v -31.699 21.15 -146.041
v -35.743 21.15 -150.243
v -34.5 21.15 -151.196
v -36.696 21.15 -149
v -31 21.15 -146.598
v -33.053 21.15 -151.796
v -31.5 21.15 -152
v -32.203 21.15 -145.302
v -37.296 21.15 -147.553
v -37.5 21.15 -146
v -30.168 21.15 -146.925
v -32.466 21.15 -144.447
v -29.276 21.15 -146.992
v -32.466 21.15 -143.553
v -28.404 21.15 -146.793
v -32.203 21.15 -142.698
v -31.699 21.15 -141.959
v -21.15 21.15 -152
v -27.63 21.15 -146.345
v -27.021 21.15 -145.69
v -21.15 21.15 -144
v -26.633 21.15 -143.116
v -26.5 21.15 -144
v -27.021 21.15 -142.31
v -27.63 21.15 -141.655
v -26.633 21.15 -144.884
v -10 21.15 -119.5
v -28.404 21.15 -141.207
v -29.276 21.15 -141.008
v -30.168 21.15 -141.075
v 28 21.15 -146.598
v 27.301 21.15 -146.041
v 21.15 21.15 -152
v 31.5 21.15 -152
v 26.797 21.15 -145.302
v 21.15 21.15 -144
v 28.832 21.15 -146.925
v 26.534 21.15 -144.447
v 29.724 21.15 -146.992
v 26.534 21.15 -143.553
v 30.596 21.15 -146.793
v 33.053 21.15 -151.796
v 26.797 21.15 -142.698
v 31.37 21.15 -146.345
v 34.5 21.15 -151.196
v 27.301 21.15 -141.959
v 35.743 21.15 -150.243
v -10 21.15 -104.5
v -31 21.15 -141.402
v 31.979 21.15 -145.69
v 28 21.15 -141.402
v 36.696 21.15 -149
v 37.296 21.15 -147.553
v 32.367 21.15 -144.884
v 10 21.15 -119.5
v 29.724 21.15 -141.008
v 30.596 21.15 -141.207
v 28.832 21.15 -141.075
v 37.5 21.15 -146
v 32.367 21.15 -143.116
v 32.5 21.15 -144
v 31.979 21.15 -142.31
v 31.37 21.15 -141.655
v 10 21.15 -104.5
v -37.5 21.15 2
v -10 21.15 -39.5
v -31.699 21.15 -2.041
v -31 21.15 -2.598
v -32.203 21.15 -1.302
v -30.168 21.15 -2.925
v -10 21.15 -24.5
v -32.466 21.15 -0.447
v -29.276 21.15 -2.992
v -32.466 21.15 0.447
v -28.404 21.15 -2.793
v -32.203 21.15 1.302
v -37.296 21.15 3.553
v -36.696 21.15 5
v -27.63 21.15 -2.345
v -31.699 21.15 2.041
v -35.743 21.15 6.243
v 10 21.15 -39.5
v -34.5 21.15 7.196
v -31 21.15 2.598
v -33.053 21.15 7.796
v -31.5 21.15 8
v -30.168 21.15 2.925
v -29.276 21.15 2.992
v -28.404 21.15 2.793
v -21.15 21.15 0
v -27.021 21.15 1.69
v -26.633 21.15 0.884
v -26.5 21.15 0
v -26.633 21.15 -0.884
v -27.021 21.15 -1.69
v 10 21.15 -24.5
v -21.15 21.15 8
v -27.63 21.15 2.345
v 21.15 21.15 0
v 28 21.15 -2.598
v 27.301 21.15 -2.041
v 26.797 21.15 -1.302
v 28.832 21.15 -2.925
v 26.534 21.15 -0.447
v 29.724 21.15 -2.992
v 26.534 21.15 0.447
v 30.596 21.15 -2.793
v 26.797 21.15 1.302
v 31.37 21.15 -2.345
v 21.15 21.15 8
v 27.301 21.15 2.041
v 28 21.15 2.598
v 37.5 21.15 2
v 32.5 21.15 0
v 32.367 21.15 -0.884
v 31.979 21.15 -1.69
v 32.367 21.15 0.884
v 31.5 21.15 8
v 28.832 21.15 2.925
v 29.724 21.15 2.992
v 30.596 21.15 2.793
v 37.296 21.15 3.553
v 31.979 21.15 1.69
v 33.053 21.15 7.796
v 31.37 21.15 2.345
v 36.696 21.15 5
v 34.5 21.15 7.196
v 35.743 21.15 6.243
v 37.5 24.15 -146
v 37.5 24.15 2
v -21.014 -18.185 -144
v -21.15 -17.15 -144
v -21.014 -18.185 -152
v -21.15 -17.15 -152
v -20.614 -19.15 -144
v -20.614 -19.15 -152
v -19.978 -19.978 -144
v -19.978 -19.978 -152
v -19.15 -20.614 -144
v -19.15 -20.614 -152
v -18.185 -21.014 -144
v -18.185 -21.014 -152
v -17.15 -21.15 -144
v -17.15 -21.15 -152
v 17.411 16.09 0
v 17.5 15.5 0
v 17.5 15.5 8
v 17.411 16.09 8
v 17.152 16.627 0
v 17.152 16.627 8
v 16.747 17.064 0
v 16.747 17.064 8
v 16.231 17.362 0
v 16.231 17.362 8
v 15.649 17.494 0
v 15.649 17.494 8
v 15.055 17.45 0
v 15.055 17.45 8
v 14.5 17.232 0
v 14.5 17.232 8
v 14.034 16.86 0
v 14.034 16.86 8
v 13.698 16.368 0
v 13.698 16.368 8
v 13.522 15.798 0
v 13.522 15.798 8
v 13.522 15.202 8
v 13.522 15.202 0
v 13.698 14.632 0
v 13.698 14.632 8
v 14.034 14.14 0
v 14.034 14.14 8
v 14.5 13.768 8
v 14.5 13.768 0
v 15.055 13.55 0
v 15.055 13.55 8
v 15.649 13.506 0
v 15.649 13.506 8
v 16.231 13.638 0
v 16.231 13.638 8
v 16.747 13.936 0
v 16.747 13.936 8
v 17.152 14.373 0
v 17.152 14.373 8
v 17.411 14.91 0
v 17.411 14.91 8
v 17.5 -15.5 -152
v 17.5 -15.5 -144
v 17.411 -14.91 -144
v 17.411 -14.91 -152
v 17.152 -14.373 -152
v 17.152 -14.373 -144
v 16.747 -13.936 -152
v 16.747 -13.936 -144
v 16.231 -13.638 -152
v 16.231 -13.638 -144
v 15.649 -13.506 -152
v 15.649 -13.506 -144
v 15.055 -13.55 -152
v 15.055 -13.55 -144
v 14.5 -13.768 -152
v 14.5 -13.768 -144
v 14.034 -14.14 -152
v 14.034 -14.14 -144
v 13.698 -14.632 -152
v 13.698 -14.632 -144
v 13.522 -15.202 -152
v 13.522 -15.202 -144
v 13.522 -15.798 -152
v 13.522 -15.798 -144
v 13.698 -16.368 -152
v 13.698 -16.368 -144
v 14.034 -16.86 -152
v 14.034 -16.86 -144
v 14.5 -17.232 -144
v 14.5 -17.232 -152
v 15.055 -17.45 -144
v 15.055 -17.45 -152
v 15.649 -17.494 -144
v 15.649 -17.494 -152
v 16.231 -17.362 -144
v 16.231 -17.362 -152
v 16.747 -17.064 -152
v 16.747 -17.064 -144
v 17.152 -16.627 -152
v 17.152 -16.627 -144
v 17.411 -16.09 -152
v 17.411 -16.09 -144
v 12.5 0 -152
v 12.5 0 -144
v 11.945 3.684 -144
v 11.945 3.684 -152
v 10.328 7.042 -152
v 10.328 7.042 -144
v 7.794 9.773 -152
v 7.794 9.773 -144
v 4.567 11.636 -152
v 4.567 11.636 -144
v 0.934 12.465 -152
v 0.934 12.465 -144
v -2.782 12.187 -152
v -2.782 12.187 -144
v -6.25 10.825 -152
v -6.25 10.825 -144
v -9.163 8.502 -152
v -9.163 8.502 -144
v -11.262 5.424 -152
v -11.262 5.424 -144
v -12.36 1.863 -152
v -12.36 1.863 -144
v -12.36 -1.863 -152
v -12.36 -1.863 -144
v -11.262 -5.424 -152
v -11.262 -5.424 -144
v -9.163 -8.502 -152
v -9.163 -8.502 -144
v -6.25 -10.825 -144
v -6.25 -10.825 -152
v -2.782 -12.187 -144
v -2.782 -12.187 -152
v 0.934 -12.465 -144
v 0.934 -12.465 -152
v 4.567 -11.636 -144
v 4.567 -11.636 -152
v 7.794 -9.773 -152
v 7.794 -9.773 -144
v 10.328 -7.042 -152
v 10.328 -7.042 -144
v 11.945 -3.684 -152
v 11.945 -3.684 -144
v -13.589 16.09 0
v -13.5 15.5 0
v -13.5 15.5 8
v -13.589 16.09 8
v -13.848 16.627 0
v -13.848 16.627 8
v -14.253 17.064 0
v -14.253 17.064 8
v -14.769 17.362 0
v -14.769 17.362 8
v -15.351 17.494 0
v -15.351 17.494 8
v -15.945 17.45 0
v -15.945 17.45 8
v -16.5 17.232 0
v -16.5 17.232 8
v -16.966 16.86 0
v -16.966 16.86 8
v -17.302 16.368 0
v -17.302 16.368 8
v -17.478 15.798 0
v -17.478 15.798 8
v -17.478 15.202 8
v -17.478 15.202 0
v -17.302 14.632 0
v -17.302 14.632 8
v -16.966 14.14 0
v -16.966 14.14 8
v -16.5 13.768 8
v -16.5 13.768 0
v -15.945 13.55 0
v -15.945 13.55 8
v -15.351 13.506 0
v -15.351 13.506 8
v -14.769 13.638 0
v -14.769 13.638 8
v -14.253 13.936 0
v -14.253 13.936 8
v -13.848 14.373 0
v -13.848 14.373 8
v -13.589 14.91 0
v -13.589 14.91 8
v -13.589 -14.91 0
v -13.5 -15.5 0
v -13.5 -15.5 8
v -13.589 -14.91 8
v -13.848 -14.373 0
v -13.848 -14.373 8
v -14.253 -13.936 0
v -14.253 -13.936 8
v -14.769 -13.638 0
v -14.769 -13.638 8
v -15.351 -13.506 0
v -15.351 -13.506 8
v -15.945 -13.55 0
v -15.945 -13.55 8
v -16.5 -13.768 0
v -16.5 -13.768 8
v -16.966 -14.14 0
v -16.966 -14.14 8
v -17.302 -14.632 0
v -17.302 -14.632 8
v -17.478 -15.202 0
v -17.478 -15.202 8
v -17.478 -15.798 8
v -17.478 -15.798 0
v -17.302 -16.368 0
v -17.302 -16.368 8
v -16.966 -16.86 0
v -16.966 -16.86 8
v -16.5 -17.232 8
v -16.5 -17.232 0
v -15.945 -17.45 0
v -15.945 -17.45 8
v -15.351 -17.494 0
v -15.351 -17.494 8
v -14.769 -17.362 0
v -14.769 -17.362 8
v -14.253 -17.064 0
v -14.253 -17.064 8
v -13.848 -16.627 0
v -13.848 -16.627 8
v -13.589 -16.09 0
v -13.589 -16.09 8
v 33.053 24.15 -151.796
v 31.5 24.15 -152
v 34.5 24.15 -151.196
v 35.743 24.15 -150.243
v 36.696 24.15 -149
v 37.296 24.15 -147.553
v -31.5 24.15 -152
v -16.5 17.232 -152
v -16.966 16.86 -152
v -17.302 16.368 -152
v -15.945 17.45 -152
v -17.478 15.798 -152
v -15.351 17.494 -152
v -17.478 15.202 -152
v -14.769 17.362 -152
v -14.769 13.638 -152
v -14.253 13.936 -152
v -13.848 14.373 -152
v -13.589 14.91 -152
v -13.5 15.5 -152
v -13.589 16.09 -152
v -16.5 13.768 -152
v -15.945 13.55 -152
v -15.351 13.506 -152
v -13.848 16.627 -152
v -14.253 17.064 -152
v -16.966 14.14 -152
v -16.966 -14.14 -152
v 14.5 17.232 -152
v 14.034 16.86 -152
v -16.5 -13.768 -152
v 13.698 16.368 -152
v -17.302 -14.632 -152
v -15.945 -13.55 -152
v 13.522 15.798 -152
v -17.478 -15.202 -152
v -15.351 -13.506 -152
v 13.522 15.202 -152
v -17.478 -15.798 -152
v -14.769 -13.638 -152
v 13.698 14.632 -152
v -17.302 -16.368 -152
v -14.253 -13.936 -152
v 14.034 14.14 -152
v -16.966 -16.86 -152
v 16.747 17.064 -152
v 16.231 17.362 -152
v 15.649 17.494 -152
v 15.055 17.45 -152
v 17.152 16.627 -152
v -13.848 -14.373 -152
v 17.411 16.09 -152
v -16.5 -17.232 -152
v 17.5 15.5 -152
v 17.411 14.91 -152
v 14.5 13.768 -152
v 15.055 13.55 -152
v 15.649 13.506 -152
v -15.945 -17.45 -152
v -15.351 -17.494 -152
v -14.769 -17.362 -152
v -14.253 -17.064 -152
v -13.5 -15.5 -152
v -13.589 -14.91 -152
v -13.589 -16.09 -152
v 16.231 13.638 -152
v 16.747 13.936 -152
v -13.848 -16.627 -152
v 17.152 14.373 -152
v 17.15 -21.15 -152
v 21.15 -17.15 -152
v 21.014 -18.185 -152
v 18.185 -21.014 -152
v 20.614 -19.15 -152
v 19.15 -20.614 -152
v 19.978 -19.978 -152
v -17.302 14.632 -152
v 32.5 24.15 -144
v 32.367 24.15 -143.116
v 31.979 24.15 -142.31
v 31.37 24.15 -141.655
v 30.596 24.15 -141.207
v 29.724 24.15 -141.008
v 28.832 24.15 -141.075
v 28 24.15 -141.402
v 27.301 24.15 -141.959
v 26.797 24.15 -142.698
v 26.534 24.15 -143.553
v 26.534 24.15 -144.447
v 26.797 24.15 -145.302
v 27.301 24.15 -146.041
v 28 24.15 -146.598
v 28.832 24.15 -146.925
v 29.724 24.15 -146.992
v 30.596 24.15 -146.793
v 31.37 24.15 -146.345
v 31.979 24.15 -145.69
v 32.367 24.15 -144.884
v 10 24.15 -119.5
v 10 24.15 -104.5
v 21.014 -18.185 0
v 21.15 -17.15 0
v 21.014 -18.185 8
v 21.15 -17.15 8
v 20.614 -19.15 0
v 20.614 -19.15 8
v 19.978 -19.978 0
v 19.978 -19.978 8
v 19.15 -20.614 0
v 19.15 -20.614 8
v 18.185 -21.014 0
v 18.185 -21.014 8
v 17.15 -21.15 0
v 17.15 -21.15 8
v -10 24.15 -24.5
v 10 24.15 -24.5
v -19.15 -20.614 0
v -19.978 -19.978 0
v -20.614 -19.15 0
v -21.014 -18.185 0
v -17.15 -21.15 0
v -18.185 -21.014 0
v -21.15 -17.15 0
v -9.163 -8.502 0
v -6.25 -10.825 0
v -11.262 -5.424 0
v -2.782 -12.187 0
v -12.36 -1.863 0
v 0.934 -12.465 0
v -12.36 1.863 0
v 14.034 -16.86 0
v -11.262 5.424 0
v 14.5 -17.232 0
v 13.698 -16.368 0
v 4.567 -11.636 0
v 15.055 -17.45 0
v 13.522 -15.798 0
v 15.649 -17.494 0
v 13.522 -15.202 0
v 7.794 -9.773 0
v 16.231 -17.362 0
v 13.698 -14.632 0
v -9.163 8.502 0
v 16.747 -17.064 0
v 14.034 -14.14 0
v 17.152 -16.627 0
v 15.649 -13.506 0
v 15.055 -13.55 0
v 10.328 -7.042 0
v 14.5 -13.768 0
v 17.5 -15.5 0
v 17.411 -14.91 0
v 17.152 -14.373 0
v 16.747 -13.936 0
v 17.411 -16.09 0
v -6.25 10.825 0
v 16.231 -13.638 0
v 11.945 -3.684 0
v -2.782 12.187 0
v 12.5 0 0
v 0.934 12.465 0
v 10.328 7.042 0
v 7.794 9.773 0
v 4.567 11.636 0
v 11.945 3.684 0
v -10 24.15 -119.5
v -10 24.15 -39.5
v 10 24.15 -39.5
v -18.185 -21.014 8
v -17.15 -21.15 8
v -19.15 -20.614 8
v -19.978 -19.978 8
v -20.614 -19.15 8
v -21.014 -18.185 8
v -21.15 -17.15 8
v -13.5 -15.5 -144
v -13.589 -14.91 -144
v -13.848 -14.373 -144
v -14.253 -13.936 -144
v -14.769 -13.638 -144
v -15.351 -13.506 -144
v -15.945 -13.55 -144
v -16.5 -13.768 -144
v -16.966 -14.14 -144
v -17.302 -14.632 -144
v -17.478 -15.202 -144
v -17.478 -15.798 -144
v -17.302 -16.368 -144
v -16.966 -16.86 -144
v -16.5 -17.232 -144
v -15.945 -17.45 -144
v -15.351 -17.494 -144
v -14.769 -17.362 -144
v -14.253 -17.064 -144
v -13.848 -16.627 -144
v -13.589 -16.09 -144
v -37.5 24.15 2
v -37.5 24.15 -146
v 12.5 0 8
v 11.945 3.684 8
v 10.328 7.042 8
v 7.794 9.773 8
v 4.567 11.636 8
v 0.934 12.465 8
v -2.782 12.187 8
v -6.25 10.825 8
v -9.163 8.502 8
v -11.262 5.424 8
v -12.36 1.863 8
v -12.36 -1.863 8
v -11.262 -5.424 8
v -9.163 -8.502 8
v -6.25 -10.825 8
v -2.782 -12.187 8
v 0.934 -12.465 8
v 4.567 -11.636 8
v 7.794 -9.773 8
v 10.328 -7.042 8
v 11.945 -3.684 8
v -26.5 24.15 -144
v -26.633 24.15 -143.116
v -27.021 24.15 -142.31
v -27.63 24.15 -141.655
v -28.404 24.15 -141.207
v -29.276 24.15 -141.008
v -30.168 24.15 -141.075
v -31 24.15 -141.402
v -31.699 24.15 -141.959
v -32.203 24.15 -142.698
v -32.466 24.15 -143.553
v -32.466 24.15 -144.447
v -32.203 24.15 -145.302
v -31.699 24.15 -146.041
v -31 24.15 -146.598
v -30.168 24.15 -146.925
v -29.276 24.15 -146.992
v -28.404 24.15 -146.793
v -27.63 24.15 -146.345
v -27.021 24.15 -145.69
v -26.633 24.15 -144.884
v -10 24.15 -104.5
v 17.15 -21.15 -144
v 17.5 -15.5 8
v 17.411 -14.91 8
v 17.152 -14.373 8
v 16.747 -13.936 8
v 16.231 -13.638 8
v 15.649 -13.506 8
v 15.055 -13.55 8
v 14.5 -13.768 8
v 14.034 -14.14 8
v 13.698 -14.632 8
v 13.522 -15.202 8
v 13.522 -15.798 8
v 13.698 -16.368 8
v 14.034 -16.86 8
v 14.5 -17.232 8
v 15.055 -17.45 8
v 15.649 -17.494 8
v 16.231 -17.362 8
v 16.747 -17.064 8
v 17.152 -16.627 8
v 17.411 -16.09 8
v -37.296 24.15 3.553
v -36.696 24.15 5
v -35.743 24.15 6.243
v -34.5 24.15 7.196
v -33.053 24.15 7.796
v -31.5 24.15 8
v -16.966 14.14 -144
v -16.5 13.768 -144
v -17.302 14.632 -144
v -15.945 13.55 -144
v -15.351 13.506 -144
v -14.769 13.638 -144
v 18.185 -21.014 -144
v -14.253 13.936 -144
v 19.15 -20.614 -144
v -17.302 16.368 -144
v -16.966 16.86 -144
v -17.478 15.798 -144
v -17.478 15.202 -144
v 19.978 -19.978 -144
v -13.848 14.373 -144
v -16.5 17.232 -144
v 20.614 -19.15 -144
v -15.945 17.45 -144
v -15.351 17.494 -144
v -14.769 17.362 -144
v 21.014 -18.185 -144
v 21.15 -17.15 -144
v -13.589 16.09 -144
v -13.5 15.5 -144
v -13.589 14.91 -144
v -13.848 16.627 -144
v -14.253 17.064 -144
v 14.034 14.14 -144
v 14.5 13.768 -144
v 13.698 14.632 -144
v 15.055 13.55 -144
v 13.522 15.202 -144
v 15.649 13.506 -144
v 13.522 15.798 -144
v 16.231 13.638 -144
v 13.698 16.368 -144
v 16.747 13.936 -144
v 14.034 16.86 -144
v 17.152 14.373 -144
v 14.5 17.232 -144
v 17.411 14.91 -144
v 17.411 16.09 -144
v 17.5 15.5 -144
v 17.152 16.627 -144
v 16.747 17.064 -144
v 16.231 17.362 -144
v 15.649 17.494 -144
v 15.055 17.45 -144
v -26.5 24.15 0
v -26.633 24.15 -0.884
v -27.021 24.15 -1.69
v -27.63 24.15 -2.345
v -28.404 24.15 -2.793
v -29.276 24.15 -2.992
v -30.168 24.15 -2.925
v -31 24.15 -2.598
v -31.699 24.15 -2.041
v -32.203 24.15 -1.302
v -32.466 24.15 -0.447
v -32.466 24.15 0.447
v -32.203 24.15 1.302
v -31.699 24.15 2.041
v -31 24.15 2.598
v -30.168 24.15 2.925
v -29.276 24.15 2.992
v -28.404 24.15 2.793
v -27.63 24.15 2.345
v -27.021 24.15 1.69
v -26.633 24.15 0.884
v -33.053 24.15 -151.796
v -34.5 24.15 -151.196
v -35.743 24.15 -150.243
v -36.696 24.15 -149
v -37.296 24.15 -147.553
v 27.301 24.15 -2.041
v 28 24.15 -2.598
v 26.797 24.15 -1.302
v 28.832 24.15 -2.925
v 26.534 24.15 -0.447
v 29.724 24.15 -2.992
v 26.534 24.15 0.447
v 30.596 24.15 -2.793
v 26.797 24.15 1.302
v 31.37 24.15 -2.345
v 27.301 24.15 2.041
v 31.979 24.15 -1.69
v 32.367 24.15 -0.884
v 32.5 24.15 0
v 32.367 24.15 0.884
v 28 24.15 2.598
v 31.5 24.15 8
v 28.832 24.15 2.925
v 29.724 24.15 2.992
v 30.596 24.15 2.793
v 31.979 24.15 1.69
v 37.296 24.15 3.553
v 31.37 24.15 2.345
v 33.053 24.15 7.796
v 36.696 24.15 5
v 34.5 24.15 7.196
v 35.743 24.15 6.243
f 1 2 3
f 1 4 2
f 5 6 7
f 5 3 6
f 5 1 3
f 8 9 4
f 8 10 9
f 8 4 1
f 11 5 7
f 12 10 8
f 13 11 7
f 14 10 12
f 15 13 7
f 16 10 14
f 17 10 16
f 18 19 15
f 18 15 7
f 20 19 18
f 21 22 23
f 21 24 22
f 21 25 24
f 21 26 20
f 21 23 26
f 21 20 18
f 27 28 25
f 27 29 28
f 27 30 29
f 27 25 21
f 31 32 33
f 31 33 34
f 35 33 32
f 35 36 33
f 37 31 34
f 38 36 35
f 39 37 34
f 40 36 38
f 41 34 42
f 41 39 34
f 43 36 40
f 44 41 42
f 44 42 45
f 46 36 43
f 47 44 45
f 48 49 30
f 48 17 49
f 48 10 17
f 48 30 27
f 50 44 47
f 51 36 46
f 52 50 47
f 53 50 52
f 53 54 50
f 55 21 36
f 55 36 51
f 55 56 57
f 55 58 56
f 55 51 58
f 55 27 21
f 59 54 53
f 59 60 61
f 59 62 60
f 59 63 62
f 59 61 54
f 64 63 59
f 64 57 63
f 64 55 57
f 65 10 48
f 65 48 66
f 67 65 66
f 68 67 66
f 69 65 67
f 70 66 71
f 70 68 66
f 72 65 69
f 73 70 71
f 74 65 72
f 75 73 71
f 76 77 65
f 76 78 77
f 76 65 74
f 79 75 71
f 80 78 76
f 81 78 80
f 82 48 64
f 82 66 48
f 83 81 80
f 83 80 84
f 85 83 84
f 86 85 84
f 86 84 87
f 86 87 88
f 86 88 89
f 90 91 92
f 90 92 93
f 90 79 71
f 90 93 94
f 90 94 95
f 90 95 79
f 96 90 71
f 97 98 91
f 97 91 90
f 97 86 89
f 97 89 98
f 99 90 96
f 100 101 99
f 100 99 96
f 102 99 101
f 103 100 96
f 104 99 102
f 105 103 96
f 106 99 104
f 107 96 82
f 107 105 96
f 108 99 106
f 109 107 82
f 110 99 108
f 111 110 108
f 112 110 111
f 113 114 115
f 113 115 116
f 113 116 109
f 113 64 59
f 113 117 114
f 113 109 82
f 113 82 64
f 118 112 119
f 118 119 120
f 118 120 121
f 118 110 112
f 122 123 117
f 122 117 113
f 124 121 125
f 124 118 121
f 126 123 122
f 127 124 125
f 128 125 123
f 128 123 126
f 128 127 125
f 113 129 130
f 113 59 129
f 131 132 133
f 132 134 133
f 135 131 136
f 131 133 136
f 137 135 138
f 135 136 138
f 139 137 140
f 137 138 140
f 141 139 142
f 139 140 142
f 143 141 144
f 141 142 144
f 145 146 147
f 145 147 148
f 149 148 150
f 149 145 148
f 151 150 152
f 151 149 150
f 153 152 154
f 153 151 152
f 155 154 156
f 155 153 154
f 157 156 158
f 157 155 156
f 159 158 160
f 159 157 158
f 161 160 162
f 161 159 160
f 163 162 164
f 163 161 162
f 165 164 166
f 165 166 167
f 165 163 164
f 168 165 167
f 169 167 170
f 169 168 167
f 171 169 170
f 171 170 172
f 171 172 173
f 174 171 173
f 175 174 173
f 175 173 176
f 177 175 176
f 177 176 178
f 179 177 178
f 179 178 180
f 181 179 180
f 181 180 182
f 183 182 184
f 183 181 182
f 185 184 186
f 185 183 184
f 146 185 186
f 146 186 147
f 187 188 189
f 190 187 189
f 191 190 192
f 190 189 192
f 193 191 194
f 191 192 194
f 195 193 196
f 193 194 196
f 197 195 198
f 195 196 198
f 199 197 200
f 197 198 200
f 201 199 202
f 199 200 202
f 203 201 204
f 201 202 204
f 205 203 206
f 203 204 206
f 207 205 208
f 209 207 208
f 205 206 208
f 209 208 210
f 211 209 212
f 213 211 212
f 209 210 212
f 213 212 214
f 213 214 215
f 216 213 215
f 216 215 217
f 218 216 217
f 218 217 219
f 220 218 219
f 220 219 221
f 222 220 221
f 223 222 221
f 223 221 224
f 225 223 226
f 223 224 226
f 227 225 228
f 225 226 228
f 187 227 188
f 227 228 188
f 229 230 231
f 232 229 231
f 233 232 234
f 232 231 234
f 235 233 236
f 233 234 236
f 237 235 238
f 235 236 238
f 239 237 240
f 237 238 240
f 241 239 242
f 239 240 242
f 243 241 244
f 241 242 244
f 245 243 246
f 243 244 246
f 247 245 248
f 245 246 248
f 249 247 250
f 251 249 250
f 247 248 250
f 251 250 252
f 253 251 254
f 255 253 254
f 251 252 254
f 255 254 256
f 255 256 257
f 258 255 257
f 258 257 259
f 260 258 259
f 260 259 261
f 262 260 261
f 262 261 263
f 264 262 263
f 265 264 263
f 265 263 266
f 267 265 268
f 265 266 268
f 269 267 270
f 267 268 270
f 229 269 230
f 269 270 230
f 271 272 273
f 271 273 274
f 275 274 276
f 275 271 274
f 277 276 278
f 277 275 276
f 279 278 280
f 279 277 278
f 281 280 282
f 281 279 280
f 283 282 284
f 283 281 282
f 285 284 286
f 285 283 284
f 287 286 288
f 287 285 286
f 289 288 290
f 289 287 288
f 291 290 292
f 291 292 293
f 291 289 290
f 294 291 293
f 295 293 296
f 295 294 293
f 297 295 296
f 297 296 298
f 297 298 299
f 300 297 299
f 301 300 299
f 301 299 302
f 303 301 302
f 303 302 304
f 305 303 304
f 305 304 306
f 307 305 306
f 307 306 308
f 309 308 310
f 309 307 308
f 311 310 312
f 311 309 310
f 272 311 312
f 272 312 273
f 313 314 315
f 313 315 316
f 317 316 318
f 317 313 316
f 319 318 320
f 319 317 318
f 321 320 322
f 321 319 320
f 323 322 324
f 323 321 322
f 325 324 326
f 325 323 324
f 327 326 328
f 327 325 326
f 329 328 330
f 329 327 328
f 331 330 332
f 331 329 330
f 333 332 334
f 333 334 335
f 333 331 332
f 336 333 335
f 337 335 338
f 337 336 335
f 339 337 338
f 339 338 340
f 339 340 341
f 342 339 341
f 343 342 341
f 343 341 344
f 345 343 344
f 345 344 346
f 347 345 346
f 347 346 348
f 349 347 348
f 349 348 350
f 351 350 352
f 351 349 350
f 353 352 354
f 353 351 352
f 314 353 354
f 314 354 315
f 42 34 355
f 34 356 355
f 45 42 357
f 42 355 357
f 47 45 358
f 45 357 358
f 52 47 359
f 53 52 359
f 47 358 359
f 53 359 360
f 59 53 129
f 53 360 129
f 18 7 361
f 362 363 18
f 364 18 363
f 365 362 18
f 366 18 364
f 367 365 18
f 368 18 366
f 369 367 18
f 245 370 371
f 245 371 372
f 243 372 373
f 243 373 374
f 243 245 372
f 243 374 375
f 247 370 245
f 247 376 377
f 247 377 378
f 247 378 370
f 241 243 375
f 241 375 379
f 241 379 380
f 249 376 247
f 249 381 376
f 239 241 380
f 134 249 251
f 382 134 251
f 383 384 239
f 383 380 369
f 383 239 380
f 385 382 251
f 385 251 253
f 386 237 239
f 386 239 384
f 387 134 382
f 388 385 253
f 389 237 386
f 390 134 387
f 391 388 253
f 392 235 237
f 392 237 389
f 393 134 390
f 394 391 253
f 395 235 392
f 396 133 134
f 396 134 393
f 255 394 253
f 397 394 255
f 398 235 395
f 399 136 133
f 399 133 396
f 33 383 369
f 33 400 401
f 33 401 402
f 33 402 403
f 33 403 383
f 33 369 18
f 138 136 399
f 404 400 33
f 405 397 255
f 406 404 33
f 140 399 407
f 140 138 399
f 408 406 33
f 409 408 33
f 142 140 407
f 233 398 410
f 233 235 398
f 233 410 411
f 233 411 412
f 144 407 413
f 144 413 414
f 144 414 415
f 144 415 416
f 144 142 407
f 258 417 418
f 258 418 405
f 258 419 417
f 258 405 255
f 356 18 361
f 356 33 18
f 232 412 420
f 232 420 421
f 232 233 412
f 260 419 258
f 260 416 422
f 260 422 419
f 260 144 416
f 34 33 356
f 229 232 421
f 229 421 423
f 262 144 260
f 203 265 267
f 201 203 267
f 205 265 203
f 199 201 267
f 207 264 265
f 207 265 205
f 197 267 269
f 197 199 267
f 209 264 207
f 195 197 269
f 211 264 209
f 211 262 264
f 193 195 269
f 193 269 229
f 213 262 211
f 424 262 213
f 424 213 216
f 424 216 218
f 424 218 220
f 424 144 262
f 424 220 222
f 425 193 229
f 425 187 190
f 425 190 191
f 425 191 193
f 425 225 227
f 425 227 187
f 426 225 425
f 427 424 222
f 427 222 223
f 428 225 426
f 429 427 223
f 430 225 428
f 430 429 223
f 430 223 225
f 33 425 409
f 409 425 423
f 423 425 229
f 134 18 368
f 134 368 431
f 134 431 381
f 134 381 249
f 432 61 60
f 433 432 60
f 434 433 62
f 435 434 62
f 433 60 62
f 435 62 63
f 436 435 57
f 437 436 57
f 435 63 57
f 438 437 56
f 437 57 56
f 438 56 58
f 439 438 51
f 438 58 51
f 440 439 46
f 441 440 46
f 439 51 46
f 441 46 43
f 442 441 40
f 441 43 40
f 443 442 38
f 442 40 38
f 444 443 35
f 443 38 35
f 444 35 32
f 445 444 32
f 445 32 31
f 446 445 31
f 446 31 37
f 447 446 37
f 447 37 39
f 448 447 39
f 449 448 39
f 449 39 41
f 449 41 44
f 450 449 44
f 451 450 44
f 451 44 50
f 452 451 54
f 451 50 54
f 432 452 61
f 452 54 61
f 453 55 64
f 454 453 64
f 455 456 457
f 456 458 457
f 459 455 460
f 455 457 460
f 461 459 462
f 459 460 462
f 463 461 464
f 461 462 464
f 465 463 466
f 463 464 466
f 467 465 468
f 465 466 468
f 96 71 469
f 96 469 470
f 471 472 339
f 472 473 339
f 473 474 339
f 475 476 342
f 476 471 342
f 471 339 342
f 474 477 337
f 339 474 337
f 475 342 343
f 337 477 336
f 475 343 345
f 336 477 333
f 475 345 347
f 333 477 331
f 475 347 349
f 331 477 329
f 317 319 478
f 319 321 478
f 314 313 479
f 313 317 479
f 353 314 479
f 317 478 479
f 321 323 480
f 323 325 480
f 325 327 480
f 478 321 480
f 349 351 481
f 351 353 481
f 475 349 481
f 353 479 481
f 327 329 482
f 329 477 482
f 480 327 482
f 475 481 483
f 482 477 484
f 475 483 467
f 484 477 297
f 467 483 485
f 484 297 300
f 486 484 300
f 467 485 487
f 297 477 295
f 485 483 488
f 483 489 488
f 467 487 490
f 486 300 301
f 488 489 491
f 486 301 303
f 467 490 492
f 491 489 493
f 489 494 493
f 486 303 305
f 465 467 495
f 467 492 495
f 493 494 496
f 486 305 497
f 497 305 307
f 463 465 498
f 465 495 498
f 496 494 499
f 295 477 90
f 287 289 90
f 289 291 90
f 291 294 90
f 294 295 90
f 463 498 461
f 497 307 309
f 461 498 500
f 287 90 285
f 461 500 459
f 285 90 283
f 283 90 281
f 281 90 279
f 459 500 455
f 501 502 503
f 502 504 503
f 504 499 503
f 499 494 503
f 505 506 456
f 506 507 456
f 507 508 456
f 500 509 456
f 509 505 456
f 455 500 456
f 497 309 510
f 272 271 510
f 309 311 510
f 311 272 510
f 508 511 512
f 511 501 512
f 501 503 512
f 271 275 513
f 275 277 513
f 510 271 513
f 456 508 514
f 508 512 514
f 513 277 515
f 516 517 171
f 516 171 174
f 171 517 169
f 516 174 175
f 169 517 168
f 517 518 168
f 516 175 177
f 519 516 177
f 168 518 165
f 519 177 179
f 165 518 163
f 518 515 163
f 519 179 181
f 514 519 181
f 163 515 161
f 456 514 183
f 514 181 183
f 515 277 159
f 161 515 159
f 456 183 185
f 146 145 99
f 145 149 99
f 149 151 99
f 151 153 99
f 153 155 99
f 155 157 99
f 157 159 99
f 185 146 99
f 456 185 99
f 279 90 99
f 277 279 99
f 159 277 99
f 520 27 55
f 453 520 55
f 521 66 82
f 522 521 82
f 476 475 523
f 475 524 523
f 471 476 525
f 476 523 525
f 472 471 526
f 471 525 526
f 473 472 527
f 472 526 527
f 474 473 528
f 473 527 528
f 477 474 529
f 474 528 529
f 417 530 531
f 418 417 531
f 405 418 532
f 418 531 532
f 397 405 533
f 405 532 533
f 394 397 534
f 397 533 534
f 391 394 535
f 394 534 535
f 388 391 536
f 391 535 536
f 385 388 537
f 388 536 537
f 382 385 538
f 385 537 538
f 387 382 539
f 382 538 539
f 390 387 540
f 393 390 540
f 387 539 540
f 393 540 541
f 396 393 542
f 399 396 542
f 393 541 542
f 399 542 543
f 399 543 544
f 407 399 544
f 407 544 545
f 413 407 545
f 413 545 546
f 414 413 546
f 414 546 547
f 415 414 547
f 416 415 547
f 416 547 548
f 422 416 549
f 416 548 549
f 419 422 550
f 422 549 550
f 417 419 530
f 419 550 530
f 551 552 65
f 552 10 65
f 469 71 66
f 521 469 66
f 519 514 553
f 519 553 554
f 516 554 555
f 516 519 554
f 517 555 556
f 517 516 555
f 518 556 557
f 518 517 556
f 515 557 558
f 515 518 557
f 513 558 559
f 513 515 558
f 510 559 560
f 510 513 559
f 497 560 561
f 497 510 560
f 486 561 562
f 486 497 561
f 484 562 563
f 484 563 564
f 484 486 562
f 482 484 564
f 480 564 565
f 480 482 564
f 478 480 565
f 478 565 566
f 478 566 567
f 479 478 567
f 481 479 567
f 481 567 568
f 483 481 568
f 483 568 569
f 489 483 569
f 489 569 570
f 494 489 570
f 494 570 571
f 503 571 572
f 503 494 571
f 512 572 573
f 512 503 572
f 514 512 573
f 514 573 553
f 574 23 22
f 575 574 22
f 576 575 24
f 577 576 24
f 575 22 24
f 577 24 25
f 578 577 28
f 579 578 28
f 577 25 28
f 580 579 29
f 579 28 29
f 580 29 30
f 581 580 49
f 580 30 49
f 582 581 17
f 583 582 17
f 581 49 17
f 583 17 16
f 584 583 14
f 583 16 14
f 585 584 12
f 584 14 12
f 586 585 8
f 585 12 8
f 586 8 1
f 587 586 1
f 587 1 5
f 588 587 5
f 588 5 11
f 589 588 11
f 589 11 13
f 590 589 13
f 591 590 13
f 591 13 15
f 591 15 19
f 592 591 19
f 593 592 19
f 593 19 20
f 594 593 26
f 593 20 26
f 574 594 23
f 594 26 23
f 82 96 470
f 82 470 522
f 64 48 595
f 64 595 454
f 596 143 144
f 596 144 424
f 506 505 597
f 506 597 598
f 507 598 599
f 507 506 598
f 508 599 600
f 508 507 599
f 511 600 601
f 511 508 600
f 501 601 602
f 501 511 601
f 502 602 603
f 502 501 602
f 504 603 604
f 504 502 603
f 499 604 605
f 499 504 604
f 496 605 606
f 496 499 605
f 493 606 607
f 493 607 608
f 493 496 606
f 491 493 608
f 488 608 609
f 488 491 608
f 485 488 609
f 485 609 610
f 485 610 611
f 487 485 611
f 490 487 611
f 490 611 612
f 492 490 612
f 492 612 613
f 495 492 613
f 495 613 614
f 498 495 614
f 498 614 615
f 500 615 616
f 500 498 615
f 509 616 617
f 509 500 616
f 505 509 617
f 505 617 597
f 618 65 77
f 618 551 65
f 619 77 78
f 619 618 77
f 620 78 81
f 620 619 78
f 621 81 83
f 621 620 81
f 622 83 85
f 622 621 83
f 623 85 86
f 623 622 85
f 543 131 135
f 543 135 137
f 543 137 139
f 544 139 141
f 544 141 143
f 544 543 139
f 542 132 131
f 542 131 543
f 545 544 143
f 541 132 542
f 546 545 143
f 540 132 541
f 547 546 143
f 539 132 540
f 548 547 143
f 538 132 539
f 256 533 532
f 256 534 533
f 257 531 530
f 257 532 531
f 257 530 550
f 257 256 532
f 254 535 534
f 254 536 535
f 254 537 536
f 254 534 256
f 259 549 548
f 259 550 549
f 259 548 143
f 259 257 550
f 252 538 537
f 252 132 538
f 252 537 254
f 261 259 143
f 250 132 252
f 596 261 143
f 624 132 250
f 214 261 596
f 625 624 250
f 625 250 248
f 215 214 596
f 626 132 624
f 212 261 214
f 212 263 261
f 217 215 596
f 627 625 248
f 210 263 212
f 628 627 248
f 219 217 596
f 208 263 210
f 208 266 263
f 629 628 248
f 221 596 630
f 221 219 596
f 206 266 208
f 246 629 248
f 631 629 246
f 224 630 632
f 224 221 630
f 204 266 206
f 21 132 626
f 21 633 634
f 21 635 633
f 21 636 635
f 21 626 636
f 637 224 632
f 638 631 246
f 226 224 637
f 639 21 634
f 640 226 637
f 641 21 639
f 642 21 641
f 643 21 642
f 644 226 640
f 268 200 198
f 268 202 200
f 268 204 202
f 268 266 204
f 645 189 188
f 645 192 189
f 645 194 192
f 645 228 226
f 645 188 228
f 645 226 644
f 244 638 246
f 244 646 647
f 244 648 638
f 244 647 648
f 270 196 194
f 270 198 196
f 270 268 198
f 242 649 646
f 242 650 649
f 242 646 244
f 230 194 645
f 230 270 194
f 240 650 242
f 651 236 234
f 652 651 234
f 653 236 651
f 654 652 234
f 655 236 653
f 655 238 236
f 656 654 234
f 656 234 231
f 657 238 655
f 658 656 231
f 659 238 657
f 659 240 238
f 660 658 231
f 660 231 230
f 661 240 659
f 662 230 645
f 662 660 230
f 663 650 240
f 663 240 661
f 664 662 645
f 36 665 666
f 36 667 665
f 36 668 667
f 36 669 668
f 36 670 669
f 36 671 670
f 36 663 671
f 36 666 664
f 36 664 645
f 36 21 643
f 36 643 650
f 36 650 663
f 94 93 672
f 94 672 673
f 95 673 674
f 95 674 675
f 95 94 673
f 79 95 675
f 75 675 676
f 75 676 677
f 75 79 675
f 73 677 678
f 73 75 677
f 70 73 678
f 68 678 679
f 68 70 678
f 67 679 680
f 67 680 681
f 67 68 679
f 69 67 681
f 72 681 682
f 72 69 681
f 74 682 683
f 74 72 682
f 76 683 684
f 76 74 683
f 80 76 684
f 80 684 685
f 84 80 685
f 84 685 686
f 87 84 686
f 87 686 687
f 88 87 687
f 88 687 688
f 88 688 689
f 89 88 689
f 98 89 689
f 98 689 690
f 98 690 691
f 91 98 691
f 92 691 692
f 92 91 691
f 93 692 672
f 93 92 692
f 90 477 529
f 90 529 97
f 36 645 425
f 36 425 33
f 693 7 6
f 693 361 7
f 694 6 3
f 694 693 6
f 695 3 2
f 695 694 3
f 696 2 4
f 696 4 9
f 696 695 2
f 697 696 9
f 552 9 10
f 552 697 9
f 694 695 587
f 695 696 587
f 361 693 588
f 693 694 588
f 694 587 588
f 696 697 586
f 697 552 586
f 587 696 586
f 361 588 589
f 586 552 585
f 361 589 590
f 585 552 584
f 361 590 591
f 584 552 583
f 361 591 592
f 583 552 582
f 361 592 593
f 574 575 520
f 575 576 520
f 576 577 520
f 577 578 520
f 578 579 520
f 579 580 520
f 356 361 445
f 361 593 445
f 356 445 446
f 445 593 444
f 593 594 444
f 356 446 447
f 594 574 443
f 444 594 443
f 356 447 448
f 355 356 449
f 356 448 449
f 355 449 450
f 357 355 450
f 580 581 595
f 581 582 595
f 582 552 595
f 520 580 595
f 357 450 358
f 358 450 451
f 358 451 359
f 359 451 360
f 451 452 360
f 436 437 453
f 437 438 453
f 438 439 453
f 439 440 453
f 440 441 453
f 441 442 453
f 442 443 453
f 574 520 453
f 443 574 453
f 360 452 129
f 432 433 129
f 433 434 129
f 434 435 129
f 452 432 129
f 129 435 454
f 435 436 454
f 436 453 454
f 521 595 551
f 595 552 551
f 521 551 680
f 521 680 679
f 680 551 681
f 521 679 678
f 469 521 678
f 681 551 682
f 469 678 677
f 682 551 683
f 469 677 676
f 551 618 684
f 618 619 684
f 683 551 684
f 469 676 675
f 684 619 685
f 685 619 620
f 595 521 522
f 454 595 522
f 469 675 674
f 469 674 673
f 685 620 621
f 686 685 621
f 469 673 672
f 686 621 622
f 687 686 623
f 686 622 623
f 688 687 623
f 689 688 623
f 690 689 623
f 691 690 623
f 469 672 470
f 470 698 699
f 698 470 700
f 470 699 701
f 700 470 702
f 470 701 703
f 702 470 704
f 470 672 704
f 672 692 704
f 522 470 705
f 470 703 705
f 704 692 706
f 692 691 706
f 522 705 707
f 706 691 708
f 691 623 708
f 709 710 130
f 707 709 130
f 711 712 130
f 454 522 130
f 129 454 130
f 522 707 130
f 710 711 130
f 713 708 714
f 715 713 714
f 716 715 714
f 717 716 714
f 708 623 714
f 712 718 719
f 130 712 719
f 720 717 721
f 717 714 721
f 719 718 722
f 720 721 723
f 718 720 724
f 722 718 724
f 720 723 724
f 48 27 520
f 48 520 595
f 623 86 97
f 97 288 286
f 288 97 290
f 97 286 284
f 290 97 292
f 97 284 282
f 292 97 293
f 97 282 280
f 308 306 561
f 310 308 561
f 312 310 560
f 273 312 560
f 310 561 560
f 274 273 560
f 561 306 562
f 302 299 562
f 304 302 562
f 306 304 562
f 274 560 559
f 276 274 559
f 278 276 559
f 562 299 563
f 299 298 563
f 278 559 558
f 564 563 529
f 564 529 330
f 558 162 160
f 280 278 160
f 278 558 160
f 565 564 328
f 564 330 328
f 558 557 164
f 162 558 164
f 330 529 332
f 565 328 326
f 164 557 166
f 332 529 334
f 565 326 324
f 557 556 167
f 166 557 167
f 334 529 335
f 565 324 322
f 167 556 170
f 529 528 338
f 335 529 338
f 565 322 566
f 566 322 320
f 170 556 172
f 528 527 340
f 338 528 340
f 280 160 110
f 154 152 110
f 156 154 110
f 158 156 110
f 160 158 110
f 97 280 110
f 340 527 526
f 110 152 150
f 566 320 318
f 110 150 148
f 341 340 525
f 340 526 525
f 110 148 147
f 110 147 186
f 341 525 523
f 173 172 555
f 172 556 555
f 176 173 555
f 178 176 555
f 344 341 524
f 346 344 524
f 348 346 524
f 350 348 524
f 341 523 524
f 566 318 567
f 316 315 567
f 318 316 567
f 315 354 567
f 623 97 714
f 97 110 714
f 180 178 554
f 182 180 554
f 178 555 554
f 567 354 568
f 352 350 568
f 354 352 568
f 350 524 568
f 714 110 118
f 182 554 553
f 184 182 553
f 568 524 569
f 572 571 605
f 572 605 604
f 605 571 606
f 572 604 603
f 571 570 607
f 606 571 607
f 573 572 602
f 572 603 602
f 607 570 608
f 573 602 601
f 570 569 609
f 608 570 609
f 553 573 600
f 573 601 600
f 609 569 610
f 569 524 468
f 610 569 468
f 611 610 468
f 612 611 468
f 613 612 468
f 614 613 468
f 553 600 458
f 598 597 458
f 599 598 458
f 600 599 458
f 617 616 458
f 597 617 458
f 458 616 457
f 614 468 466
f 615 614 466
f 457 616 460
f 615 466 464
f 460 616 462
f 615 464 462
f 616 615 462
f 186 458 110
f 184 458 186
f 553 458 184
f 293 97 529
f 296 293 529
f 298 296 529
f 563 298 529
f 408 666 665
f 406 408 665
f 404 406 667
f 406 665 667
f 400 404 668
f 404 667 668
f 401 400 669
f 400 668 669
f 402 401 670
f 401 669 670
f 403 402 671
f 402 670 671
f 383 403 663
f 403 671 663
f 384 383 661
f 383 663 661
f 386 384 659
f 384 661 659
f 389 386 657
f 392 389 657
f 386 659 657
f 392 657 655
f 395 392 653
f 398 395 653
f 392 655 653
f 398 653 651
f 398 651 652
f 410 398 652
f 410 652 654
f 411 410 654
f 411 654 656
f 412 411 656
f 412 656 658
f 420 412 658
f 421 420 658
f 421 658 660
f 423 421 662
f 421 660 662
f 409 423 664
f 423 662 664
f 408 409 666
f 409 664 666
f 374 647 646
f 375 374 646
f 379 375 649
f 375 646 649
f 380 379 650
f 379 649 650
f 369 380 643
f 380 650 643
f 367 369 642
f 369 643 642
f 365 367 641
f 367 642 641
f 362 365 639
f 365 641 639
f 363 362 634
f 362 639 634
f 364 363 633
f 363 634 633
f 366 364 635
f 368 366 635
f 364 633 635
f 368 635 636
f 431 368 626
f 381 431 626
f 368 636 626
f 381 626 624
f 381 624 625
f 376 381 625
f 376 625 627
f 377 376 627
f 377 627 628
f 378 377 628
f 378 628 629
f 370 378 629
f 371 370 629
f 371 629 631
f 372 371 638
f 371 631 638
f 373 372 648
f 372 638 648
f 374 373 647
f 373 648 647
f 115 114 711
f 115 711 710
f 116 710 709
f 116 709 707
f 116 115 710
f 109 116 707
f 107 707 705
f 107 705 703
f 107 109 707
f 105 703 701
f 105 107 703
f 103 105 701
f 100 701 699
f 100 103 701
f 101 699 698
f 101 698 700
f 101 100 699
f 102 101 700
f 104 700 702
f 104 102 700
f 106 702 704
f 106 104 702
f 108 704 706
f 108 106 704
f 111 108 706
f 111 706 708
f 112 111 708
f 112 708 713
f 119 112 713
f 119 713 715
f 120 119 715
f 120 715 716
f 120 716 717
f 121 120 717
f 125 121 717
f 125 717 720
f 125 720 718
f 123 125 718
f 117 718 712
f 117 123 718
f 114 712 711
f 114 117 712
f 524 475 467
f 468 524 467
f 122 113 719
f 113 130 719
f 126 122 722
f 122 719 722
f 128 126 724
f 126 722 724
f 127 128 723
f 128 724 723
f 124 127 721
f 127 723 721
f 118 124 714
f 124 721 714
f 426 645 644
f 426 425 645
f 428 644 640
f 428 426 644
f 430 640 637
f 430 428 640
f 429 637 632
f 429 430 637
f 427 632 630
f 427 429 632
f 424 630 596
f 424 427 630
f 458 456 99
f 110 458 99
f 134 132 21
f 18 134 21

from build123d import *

# Parameters (mm, degrees)
CROQUIS1_W              = 42.3
CROQUIS1_H              = 42.3
CROQUIS1_R              = 12.5
CROQUIS1_R_2            = 2
SALIENTE_EXTRUIR2_DEPTH = 8
CROQUIS3_W              = 75
CROQUIS3_H              = 80
CROQUIS3_R              = 3
CROQUIS3_W_2            = 20
CROQUIS3_H_2            = 15
SALIENTE_EXTRUIR3_DEPTH = 3
REDONDEO1_R             = 4
REDONDEO3_R             = 6


with BuildPart() as part:
    # Croquis1 → Saliente-Extruir2 (new body)
    with BuildSketch(Plane.XY):
        Rectangle(CROQUIS1_W, CROQUIS1_H)
        Circle(CROQUIS1_R, mode=Mode.SUBTRACT)
        with Locations((-15.5, 15.5)):
            Circle(CROQUIS1_R_2, mode=Mode.SUBTRACT)
        with Locations((15.5, 15.5)):
            Circle(CROQUIS1_R_2, mode=Mode.SUBTRACT)
        with Locations((15.5, -15.5)):
            Circle(CROQUIS1_R_2, mode=Mode.SUBTRACT)
        with Locations((-15.5, -15.5)):
            Circle(CROQUIS1_R_2, mode=Mode.SUBTRACT)
    saliente_extruir2 = extrude(amount=SALIENTE_EXTRUIR2_DEPTH)

    # Croquis3 → Saliente-Extruir3 (add)
    with BuildSketch(Plane(origin=(0, 21.15, 0), x_dir=(1, 0, 0), z_dir=(0, 1, 0))):
        with Locations((0, 32)):
            Rectangle(CROQUIS3_W, CROQUIS3_H)
        with Locations((-29.5, 0)):
            Circle(CROQUIS3_R, mode=Mode.SUBTRACT)
        with Locations((29.5, 0)):
            Circle(CROQUIS3_R, mode=Mode.SUBTRACT)
        with Locations((0, 32)):
            Rectangle(CROQUIS3_W_2, CROQUIS3_H_2, mode=Mode.SUBTRACT)
    saliente_extruir3 = extrude(amount=SALIENTE_EXTRUIR3_DEPTH)

    # Simetría10: Saliente-Extruir3 across plane
    add(saliente_extruir3.mirror(Plane(origin=(0, 0, -72), x_dir=(1, 0, 0), z_dir=(0, 0, -1))))

    # Simetría12: Saliente-Extruir2 across plane
    add(saliente_extruir2.mirror(Plane(origin=(0, 0, -72), x_dir=(1, 0, 0), z_dir=(0, 0, -1))))

    # Redondeo1
    redondeo1_edges = [part.edges().sort_by_distance(p)[0] for p in [
        (21.15, -21.15, 4),
        (-21.15, -21.15, 4),
        (-21.15, -21.15, -148),
        (21.15, -21.15, -148),
    ]]
    fillet(redondeo1_edges, radius=REDONDEO1_R)

    # Redondeo3
    redondeo3_edges = [part.edges().sort_by_distance(p)[0] for p in [
        (-37.5, 22.65, 8),
        (37.5, 22.65, 8),
        (-37.5, 22.65, -152),
        (37.5, 22.65, -152),
    ]]
    fillet(redondeo3_edges, radius=REDONDEO3_R)


solid = part.part
